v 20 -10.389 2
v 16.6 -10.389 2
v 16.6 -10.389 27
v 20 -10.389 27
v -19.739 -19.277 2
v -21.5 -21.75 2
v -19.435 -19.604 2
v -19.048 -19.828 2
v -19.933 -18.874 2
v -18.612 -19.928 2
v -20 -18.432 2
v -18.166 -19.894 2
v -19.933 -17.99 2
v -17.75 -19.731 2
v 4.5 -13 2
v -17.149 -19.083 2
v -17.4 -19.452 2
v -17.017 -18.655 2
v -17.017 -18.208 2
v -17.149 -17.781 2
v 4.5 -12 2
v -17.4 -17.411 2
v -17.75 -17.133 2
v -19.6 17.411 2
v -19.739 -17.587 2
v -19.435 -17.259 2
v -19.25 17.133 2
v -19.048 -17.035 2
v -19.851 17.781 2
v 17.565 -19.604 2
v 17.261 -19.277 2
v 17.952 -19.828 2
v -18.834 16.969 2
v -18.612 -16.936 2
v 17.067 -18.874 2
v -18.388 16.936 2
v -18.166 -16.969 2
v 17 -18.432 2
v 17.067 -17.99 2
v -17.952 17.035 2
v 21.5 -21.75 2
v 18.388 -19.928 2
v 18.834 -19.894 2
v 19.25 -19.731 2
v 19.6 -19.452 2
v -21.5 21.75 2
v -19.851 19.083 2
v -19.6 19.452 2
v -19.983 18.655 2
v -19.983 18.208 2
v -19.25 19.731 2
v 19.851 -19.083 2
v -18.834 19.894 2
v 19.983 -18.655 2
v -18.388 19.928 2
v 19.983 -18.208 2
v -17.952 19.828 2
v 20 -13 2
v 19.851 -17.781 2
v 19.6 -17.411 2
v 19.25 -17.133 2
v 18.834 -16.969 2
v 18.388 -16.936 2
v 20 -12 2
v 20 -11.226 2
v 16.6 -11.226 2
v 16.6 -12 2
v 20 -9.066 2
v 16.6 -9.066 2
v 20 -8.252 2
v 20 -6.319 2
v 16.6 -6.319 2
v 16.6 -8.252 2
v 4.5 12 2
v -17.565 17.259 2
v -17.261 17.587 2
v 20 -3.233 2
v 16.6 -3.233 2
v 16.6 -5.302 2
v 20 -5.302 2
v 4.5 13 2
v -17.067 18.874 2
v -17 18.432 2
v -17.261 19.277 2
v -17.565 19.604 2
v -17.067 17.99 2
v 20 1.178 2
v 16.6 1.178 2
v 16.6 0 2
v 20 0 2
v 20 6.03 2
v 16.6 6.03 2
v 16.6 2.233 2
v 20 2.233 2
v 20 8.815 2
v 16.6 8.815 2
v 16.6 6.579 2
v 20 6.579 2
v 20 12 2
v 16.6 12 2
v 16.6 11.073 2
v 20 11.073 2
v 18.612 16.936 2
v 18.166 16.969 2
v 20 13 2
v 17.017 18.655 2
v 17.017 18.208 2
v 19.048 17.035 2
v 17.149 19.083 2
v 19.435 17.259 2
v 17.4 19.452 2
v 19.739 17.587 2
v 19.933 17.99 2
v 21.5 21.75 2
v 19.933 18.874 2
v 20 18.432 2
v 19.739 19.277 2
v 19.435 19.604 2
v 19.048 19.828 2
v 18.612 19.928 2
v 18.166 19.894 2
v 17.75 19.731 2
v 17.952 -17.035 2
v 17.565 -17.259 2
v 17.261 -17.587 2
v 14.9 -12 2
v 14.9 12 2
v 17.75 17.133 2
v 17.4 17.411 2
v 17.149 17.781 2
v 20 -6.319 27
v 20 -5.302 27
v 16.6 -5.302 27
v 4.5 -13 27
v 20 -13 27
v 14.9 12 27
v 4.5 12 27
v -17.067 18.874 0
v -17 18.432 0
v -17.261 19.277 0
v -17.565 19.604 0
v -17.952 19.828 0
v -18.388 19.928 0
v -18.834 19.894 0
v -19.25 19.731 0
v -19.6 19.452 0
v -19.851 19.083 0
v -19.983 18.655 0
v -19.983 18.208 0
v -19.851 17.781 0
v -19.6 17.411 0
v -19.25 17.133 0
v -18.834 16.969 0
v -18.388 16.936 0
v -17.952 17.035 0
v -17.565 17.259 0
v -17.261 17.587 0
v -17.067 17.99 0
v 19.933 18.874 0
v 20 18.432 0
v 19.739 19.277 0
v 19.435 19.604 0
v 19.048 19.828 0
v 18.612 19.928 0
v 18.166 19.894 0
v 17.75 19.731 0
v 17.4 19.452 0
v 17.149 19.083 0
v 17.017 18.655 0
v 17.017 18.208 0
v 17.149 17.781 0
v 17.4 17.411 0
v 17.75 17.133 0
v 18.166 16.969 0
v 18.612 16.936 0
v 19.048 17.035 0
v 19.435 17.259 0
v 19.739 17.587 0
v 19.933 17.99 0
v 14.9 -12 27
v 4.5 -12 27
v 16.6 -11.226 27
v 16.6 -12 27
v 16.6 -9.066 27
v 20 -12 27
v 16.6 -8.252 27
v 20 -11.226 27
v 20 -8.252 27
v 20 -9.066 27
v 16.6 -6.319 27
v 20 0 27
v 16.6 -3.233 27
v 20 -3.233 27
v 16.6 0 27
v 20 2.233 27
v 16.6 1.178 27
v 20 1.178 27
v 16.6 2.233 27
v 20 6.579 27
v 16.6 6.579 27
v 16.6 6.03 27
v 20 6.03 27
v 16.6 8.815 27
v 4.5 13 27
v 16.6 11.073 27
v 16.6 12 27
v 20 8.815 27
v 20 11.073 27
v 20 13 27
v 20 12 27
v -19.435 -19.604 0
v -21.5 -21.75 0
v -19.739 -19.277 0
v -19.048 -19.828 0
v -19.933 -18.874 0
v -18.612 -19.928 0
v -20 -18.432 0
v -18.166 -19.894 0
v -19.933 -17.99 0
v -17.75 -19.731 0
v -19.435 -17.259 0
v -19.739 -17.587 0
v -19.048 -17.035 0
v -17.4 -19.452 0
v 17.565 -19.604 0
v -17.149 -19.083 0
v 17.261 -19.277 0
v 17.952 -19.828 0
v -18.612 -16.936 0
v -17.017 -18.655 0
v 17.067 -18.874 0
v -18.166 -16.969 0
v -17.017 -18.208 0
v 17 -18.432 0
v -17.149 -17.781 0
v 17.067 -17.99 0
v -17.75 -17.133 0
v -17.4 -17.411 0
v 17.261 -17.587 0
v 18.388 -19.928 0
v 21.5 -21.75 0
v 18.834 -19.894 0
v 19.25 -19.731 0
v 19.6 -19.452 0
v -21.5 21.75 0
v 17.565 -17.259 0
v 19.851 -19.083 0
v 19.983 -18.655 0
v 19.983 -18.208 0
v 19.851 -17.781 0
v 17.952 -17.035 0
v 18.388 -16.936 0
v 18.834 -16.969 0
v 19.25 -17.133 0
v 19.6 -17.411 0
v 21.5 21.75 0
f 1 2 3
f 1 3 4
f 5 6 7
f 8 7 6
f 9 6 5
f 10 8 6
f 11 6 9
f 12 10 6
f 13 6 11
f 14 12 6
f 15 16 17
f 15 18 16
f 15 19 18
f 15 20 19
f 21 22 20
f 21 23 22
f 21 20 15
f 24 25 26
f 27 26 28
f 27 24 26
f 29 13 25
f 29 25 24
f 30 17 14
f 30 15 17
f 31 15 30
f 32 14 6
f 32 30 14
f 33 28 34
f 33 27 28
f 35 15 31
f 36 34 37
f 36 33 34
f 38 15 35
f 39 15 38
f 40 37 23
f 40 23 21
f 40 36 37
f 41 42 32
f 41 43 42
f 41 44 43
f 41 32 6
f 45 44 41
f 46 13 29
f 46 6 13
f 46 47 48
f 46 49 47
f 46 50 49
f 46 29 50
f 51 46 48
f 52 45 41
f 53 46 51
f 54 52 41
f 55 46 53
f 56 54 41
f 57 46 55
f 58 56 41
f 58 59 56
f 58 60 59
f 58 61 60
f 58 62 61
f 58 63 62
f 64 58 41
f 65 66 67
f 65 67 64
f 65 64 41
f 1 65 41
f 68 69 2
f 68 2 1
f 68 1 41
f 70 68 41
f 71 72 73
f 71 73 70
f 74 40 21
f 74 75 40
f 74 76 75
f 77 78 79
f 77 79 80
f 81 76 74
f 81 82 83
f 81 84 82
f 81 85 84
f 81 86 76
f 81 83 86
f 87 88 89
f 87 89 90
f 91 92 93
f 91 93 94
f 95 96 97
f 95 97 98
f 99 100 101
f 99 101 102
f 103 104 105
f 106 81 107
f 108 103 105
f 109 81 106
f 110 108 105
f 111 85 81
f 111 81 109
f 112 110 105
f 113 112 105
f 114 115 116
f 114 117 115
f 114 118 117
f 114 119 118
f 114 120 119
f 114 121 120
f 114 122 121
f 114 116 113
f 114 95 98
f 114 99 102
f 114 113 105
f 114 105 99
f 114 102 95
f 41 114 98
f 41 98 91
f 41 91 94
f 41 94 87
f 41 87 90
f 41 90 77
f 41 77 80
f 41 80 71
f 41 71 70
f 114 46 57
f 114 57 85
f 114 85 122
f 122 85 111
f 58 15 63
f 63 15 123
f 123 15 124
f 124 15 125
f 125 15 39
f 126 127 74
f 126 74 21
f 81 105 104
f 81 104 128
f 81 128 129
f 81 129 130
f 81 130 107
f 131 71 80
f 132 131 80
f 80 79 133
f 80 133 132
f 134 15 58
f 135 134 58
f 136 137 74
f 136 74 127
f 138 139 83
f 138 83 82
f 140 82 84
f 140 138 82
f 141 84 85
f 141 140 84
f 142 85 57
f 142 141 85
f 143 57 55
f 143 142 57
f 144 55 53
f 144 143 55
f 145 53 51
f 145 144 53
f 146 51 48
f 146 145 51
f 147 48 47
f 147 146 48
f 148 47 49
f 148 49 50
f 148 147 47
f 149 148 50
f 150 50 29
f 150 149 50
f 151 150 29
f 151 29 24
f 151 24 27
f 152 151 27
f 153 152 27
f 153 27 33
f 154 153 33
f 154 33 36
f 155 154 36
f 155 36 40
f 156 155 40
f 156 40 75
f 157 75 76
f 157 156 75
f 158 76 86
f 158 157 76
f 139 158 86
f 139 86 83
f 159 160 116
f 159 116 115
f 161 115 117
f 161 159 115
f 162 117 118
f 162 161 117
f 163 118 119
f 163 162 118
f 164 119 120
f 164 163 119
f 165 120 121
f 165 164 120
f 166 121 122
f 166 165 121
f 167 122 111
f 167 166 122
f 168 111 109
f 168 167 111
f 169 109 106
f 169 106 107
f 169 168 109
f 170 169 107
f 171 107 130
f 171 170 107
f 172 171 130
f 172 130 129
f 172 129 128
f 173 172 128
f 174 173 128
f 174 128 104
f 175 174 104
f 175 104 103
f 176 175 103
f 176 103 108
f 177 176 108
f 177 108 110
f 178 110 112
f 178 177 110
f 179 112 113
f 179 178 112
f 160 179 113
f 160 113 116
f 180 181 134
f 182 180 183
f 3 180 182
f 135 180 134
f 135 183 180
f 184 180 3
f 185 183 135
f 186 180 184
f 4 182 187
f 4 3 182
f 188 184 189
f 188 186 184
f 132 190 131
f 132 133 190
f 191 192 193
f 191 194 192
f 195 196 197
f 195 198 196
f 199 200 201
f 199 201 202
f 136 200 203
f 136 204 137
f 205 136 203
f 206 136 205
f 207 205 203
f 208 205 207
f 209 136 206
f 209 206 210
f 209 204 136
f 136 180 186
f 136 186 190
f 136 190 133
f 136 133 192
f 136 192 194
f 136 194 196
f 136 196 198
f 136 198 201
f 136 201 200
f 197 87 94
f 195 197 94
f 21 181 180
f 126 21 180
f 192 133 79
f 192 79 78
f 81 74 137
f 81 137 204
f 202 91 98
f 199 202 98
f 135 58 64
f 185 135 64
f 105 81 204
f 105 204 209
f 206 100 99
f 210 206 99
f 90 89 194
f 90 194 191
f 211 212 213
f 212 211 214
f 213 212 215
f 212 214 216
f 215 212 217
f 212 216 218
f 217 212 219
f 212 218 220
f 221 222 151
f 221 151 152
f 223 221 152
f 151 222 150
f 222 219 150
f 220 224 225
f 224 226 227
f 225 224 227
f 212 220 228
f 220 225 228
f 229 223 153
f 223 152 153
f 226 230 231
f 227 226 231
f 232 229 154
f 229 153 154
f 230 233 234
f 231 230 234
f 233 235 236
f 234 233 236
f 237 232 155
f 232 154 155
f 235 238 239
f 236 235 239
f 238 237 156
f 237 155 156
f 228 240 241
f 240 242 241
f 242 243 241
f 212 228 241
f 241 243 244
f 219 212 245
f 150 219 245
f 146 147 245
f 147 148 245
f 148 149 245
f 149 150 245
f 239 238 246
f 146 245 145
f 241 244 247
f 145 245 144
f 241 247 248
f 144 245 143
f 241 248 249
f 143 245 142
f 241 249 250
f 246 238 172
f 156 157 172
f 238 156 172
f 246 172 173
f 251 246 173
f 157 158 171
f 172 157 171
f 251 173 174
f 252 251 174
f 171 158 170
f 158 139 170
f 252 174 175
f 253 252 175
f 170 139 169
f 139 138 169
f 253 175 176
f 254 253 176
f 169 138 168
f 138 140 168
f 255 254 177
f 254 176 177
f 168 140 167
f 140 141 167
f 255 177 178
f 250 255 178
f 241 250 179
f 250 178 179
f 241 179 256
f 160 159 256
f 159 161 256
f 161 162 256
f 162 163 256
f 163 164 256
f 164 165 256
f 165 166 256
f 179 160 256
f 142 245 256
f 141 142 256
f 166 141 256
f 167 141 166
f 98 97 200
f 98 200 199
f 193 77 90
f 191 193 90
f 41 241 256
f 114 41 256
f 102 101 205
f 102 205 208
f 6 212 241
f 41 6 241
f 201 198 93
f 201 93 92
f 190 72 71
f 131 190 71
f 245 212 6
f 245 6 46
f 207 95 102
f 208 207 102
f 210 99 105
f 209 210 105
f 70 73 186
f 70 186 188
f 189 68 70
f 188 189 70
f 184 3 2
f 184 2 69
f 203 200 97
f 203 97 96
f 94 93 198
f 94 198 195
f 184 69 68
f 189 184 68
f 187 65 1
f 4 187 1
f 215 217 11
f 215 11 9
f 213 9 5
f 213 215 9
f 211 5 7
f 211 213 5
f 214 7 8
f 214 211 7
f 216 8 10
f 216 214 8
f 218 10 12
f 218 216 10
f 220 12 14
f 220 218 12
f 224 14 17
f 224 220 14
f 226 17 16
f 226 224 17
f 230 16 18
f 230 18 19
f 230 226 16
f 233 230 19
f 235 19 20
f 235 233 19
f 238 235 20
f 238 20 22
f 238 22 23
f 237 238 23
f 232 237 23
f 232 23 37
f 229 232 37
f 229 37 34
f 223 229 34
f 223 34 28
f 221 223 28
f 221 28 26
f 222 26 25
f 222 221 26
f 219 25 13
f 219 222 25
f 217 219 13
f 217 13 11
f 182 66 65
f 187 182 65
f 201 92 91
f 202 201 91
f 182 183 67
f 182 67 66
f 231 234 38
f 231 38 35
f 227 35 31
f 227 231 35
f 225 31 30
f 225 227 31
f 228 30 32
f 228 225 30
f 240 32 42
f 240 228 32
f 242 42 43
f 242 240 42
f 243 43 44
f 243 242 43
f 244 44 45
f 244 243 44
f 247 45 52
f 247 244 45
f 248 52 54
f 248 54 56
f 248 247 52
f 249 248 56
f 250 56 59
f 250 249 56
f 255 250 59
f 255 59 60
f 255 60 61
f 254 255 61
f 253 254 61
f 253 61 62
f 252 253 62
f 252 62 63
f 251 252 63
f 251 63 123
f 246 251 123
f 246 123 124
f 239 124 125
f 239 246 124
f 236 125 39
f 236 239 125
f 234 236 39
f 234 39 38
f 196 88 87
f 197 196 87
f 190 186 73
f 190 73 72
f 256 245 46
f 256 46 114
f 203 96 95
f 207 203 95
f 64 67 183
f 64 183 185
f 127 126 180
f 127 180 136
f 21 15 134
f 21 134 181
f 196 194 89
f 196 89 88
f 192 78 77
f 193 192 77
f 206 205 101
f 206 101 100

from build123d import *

# Parameters (mm, degrees)
SKETCH_1_W          = 43
SKETCH_1_H          = 43.5
SKETCH_1_R          = 1.5
EXTRUDE_1_DEPTH     = 2
SKETCH_2_W          = 15.5
SKETCH_2_H          = 26
EXTRUDE_2_DEPTH     = 25
SKETCH_3_W          = 10.4
SKETCH_3_H          = 24
SKETCH_3_W_2        = 3.4
SKETCH_3_H_2        = 0.926804748
SKETCH_3_H_3        = 0.774498031
SKETCH_3_H_4        = 2.236086948
SKETCH_3_H_5        = 3.79712878
SKETCH_3_H_6        = 1.178452045
SKETCH_3_H_7        = 1.322605193
SKETCH_3_H_8        = 1.93303836
SKETCH_3_H_9        = 2.068690175
CUT_EXTRUDE_1_DEPTH = 25


with BuildPart() as part:
    # 草图1 → 凸台-拉伸1 (new body)
    with BuildSketch(Plane.XY):
        Rectangle(SKETCH_1_W, SKETCH_1_H)
        with Locations((-18.5, 18.431705674)):
            Circle(SKETCH_1_R, mode=Mode.SUBTRACT)
        with Locations(Location((18.5, -18.431705674, 0), (0, 0, 180))):
            Circle(SKETCH_1_R, mode=Mode.SUBTRACT)
        with Locations(Location((-18.5, -18.431705674, 0), (0, 0, 180))):
            Circle(SKETCH_1_R, mode=Mode.SUBTRACT)
        with Locations((18.5, 18.431705674)):
            Circle(SKETCH_1_R, mode=Mode.SUBTRACT)
    extrude(amount=EXTRUDE_1_DEPTH)

    # 草图2 → 凸台-拉伸2 (add)
    with BuildSketch(Plane.XY.offset(2)):
        with Locations((12.25, 0)):
            Rectangle(SKETCH_2_W, SKETCH_2_H)
    extrude(amount=EXTRUDE_2_DEPTH)

    # 草图3 → 切除-拉伸1 (cut)
    with BuildSketch(Plane.XY.offset(27)):
        with Locations((9.7, 0)):
            Rectangle(SKETCH_3_W, SKETCH_3_H)
        with Locations((18.3, 11.536597626)):
            Rectangle(SKETCH_3_W_2, SKETCH_3_H_2)
        with Locations((18.3, -11.612750984)):
            Rectangle(SKETCH_3_W_2, SKETCH_3_H_3)
        with Locations((18.3, 7.69685645)):
            Rectangle(SKETCH_3_W_2, SKETCH_3_H_4)
        with Locations((18.3, 4.131774429)):
            Rectangle(SKETCH_3_W_2, SKETCH_3_H_5)
        with Locations((18.3, 0.589226023)):
            Rectangle(SKETCH_3_W_2, SKETCH_3_H_6)
        with Locations((18.3, -9.727346991)):
            Rectangle(SKETCH_3_W_2, SKETCH_3_H_7)
        with Locations((18.3, -7.285614326)):
            Rectangle(SKETCH_3_W_2, SKETCH_3_H_8)
        with Locations((18.3, -4.267361447)):
            Rectangle(SKETCH_3_W_2, SKETCH_3_H_9)
    extrude(amount=-CUT_EXTRUDE_1_DEPTH, mode=Mode.SUBTRACT)


solid = part.part
